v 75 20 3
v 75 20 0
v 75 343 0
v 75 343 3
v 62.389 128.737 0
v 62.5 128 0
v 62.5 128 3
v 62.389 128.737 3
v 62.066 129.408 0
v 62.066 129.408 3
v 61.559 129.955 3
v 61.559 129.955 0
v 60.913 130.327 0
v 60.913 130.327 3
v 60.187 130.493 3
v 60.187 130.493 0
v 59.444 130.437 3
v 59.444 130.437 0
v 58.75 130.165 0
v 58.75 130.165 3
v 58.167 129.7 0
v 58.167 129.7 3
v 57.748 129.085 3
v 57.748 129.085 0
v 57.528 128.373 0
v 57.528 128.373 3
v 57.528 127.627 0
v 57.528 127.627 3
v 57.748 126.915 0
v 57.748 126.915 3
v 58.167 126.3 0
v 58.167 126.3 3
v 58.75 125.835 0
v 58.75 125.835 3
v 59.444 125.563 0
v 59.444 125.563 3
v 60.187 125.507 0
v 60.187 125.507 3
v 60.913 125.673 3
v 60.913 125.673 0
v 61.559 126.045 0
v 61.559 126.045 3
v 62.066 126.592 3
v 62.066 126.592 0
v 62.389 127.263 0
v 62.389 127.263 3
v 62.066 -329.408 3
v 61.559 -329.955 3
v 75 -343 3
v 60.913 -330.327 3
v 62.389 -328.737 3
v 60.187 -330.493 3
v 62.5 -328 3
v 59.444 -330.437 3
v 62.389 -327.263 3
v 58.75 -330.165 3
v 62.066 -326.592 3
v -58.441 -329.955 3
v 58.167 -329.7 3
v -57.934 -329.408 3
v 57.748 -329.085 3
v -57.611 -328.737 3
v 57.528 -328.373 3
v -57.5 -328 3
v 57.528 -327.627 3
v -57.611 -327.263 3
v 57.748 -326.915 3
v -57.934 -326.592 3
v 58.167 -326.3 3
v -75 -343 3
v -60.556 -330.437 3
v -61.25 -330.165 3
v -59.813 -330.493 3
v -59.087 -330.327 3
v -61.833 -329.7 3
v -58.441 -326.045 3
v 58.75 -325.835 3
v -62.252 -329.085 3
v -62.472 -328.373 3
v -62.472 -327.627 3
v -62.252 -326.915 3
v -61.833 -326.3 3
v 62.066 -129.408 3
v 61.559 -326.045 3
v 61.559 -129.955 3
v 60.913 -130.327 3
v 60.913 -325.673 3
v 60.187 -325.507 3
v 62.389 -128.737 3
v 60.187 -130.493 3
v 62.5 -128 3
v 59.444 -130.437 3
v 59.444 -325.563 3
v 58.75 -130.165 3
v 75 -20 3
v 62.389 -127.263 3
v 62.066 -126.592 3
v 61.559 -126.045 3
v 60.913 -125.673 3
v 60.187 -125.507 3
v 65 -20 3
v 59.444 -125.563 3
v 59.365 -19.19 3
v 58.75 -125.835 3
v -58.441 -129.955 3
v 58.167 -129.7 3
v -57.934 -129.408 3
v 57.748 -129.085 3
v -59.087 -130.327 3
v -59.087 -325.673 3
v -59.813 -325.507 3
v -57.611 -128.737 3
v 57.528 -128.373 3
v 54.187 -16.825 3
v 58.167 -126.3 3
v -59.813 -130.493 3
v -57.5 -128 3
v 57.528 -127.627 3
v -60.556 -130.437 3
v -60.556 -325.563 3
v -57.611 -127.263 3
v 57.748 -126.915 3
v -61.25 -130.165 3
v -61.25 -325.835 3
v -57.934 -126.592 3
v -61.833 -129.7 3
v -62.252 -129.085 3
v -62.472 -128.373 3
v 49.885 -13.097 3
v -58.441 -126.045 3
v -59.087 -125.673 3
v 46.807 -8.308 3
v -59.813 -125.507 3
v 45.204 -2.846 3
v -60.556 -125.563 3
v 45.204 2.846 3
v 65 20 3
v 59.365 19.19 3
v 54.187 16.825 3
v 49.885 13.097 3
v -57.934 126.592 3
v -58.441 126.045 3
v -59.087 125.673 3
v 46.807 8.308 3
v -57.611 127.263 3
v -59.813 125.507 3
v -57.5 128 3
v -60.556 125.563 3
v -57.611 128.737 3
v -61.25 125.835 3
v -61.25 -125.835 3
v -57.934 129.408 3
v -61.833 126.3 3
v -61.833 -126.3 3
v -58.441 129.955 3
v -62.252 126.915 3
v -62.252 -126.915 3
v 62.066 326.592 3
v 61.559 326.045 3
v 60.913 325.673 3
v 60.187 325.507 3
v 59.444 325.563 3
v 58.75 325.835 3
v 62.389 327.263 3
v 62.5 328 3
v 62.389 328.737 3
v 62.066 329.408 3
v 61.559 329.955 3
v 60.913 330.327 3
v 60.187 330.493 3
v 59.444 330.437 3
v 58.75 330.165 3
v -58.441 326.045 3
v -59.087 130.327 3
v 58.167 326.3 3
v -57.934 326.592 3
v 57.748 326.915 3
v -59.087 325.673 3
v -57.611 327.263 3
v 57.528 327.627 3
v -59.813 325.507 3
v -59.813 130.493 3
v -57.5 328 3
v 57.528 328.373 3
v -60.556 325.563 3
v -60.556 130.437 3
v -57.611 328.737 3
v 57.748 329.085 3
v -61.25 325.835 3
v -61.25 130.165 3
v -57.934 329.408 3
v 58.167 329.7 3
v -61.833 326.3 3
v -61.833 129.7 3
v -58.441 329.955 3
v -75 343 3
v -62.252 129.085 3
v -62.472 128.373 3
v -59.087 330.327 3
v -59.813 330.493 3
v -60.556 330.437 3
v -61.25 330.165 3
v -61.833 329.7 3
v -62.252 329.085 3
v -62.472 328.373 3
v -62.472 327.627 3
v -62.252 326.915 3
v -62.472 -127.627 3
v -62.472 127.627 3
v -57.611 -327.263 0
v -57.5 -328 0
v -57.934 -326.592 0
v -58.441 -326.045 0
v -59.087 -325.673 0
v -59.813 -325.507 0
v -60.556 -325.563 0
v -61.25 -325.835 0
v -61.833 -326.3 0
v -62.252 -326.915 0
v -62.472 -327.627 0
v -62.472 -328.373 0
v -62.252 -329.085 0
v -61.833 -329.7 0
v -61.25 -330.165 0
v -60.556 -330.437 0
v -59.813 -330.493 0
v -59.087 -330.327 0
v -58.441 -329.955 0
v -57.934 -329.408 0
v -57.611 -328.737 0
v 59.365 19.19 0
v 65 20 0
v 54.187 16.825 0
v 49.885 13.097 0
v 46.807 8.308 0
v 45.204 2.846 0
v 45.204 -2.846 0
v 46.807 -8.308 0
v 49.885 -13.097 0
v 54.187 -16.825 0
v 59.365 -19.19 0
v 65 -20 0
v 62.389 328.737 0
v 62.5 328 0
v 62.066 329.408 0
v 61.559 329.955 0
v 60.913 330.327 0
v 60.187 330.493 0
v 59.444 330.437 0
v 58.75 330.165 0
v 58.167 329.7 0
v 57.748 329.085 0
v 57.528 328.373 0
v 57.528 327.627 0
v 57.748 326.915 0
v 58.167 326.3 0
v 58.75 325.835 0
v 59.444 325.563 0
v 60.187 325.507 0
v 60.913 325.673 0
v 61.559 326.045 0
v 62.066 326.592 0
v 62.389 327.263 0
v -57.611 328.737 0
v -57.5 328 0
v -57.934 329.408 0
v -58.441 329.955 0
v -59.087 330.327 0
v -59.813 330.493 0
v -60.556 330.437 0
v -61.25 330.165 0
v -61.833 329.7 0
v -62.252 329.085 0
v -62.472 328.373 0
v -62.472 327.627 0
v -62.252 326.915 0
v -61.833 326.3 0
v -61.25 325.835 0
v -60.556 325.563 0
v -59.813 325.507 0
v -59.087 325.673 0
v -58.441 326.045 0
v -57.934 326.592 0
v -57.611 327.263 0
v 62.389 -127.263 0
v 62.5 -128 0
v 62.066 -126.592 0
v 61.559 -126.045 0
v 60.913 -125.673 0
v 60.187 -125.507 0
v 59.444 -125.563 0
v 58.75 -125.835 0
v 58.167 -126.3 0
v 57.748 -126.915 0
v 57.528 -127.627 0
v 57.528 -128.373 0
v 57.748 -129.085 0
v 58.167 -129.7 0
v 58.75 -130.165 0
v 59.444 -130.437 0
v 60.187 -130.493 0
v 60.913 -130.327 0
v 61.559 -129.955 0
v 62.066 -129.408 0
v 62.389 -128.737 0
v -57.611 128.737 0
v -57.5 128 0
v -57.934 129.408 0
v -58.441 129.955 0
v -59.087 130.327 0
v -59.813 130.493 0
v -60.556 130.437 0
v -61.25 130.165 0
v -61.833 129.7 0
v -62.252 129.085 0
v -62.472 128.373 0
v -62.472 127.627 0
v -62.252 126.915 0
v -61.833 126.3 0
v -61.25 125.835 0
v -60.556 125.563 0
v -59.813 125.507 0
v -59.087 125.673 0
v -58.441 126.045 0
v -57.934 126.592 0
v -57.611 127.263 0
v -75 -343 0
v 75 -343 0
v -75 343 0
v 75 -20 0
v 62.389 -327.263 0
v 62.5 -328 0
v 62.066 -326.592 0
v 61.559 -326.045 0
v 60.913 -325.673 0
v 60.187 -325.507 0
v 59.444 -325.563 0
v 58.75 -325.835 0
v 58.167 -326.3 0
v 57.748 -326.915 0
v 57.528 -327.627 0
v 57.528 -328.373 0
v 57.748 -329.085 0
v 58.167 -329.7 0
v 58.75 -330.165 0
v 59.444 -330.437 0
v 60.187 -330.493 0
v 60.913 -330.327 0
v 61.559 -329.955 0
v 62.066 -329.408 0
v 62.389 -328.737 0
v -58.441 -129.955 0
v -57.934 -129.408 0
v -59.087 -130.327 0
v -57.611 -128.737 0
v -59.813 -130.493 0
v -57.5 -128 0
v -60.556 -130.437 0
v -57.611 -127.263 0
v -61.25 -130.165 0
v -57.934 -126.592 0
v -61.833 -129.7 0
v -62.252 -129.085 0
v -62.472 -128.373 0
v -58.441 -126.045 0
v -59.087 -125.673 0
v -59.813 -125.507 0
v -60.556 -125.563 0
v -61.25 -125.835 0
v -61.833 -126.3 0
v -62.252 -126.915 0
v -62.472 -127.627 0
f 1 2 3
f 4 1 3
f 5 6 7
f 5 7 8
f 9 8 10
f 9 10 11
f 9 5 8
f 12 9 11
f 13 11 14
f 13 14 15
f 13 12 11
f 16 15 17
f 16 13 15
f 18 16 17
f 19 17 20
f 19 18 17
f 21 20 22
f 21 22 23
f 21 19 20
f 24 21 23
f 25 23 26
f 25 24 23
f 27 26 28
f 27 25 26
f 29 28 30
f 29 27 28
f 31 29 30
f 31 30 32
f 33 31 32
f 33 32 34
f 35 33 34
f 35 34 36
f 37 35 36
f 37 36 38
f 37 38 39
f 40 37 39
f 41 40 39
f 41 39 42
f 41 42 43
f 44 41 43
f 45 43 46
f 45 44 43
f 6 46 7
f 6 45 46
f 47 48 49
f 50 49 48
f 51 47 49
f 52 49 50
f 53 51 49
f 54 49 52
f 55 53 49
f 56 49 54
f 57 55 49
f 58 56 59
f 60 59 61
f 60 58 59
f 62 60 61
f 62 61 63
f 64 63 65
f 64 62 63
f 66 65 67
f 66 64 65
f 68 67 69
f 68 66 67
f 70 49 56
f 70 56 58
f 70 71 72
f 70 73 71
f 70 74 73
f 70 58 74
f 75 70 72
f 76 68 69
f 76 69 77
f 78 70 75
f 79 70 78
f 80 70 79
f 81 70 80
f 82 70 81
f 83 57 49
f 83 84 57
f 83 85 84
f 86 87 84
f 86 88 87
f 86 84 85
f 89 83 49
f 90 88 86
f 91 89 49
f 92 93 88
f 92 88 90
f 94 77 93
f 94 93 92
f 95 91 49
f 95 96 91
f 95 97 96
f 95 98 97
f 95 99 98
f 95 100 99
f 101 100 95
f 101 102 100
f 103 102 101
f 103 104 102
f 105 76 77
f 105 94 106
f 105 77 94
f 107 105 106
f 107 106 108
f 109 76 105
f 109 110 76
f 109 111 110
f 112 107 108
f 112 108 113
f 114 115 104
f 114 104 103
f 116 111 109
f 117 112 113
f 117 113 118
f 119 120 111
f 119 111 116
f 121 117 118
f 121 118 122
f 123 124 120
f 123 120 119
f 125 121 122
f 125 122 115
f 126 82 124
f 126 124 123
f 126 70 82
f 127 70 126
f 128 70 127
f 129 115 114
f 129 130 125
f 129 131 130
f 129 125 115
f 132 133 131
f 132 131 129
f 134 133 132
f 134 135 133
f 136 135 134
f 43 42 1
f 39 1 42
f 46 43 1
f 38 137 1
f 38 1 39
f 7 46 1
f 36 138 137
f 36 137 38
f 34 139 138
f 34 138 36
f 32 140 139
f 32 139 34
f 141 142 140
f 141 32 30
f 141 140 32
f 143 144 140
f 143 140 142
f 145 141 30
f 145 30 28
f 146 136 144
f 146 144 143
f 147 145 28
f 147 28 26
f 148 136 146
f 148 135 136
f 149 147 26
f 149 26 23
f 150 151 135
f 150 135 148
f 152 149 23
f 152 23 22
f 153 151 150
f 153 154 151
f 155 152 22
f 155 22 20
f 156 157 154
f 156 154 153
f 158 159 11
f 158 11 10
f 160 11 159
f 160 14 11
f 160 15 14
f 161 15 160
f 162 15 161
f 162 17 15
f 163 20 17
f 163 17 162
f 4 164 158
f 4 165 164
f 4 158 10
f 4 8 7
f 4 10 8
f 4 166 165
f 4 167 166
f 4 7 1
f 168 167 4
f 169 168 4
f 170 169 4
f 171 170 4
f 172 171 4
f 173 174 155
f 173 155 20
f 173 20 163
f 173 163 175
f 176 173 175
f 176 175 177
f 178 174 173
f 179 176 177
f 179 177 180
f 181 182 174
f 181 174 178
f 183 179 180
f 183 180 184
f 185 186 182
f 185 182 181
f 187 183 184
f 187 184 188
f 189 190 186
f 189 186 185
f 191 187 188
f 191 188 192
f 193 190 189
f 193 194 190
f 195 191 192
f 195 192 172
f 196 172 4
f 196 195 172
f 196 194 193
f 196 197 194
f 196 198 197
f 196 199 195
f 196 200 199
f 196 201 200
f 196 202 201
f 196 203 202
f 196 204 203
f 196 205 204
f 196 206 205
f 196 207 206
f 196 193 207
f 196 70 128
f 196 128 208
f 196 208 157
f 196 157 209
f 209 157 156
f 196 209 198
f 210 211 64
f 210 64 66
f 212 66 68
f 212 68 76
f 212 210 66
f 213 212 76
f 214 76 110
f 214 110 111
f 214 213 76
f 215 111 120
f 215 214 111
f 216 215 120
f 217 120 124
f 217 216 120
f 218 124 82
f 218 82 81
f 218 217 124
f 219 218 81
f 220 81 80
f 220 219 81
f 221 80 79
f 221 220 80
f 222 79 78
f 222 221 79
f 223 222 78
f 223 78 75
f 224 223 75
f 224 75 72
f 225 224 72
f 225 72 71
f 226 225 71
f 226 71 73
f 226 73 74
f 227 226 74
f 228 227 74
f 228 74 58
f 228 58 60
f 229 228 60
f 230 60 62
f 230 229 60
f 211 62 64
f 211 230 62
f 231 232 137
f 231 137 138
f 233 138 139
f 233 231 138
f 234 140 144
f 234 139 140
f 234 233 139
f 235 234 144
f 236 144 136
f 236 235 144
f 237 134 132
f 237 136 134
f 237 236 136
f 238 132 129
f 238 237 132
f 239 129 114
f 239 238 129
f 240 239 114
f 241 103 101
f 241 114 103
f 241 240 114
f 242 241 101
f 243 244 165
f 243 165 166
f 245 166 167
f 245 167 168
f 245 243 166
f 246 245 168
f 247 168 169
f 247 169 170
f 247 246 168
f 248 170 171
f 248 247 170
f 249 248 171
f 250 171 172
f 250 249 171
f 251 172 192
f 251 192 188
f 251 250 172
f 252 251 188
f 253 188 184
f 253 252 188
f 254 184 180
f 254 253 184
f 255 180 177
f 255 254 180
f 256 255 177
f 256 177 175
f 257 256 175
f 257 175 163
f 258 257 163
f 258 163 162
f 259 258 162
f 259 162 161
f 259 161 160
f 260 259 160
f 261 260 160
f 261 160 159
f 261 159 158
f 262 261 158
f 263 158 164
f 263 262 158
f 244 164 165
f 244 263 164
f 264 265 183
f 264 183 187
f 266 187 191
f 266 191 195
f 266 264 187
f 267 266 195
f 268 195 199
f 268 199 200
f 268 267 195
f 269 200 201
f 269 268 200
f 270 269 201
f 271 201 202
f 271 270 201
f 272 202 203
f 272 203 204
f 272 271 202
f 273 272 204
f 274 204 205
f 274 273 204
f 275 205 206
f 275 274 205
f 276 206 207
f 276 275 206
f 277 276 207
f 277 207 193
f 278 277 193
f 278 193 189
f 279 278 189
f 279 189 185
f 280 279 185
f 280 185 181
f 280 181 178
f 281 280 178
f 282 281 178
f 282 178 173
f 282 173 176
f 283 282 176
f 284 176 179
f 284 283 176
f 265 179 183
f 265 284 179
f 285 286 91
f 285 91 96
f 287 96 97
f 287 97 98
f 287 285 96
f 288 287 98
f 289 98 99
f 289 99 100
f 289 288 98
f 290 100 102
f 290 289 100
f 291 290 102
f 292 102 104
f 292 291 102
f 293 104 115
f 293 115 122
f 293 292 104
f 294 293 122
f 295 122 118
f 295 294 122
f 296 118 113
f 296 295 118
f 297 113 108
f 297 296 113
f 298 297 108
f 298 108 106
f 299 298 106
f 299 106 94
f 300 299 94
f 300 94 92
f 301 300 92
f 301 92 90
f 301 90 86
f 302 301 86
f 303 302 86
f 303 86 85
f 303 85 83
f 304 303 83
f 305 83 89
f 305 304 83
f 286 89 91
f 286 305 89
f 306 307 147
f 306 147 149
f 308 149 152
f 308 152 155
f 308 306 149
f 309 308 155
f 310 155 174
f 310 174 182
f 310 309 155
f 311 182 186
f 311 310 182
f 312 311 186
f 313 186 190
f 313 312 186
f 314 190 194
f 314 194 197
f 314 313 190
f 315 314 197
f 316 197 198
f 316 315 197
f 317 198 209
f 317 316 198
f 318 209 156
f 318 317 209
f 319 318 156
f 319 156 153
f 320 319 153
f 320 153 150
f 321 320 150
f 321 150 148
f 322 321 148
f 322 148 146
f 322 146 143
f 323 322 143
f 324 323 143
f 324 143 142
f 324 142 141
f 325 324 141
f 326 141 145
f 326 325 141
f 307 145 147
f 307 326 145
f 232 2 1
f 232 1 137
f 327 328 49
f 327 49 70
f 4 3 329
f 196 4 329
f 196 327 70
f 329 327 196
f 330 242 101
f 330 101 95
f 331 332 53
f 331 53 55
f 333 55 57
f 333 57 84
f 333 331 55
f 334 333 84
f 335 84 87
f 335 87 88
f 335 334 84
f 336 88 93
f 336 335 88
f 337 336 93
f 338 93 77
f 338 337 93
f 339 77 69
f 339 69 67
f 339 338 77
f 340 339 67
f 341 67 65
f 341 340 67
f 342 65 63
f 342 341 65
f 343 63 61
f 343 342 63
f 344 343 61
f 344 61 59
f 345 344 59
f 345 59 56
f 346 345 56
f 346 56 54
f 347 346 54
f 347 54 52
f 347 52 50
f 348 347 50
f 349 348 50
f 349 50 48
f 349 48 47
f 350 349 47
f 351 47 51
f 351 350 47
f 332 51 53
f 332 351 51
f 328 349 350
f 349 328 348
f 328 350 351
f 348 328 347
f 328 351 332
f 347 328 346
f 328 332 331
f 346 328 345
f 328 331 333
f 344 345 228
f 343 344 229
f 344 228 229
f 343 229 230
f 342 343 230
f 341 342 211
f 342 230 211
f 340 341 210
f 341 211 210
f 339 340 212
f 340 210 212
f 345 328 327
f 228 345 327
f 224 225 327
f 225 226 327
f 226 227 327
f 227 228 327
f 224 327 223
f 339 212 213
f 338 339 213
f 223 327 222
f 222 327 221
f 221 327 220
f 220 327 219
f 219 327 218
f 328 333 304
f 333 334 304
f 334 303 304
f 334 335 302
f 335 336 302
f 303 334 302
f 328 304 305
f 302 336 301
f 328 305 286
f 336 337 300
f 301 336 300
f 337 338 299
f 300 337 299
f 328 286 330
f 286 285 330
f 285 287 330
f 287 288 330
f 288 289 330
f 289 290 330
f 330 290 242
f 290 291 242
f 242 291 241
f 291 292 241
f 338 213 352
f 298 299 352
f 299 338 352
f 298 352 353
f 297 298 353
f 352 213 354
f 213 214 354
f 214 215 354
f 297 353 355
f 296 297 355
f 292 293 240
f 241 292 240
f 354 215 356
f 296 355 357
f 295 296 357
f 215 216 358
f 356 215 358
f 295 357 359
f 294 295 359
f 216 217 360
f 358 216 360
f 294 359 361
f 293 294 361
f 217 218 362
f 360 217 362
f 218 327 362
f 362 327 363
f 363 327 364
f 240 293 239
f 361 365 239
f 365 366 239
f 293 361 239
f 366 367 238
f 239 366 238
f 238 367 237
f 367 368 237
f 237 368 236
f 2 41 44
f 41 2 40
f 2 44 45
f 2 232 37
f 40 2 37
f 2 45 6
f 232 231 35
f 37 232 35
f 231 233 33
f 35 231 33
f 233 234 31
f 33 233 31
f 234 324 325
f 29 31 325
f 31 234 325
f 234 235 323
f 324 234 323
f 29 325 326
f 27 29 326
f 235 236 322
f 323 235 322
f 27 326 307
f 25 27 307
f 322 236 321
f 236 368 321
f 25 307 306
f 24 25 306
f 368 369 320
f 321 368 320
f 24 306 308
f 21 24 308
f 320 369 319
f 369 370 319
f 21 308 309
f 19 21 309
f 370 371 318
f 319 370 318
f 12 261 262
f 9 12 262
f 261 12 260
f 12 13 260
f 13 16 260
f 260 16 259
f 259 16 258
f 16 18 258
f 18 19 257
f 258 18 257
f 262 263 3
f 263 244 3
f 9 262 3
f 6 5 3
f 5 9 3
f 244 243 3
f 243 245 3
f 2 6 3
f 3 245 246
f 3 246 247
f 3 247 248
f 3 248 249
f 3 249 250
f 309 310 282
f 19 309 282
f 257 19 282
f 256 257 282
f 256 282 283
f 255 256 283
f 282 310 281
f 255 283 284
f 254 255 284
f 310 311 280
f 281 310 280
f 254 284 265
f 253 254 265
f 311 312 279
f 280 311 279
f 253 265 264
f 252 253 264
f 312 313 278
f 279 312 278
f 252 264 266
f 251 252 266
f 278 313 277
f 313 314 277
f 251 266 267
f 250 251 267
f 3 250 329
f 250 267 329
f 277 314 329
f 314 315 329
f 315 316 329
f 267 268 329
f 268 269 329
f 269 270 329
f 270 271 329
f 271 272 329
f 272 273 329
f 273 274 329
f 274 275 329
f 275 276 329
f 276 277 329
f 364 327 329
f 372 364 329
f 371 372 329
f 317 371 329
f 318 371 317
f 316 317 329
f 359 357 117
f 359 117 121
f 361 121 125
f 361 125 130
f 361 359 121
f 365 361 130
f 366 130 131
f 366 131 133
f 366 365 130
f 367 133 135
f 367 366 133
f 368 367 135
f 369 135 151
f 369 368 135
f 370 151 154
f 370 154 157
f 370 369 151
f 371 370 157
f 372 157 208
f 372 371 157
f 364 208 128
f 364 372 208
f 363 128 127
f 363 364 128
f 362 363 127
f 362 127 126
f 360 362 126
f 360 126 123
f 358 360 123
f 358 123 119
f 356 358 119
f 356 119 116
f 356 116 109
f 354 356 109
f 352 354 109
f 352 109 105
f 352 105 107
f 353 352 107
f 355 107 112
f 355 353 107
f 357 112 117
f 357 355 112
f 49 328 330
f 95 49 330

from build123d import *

# Parameters (mm, degrees)
SKETCH1_W               = 686
SKETCH1_H               = 150
SKETCH1_R               = 2.5
BOSS_EXTRUDE1_DEPTH     = 3
CUT_EXTRUDE4_DEPTH      = 352.116789687
CUT_EXTRUDE4_DEPTH_BACK = 10


with BuildPart() as part:
    # Sketch1 → Boss-Extrude1 (new body)
    with BuildSketch(Plane(origin=(0, 0, 0), x_dir=(0, 1, 0), z_dir=(0, 0, 1))):
        Rectangle(SKETCH1_W, SKETCH1_H)
        with Locations(Location((-128, -60, 0), (0, 0, 270))):
            Circle(SKETCH1_R, mode=Mode.SUBTRACT)
        with Locations(Location((-328, 60, 0), (0, 0, 270))):
            Circle(SKETCH1_R, mode=Mode.SUBTRACT)
        with Locations(Location((-328, -60, 0), (0, 0, 270))):
            Circle(SKETCH1_R, mode=Mode.SUBTRACT)
        with Locations(Location((-128, 60, 0), (0, 0, 270))):
            Circle(SKETCH1_R, mode=Mode.SUBTRACT)
        with Locations(Location((328, -60, 0), (0, 0, 270))):
            Circle(SKETCH1_R, mode=Mode.SUBTRACT)
        with Locations(Location((328, 60, 0), (0, 0, 270))):
            Circle(SKETCH1_R, mode=Mode.SUBTRACT)
        with Locations(Location((128, -60, 0), (0, 0, 270))):
            Circle(SKETCH1_R, mode=Mode.SUBTRACT)
        with Locations(Location((128, 60, 0), (0, 0, 270))):
            Circle(SKETCH1_R, mode=Mode.SUBTRACT)
    extrude(amount=BOSS_EXTRUDE1_DEPTH)

    # Sketch4 → Cut-Extrude4 (cut, two sides: drawn at the far end of the back side and taken through both)
    with BuildSketch(Plane.XY.offset(3).offset(-CUT_EXTRUDE4_DEPTH_BACK)):
        with BuildLine():
            Line((75, -20), (75, 20))
            Line((75, 20), (65, 20))
            ThreePointArc((65, 20), (45, 0), (65, -20))
            Line((65, -20), (75, -20))
        make_face()
    extrude(amount=CUT_EXTRUDE4_DEPTH + CUT_EXTRUDE4_DEPTH_BACK, mode=Mode.SUBTRACT)


solid = part.part
